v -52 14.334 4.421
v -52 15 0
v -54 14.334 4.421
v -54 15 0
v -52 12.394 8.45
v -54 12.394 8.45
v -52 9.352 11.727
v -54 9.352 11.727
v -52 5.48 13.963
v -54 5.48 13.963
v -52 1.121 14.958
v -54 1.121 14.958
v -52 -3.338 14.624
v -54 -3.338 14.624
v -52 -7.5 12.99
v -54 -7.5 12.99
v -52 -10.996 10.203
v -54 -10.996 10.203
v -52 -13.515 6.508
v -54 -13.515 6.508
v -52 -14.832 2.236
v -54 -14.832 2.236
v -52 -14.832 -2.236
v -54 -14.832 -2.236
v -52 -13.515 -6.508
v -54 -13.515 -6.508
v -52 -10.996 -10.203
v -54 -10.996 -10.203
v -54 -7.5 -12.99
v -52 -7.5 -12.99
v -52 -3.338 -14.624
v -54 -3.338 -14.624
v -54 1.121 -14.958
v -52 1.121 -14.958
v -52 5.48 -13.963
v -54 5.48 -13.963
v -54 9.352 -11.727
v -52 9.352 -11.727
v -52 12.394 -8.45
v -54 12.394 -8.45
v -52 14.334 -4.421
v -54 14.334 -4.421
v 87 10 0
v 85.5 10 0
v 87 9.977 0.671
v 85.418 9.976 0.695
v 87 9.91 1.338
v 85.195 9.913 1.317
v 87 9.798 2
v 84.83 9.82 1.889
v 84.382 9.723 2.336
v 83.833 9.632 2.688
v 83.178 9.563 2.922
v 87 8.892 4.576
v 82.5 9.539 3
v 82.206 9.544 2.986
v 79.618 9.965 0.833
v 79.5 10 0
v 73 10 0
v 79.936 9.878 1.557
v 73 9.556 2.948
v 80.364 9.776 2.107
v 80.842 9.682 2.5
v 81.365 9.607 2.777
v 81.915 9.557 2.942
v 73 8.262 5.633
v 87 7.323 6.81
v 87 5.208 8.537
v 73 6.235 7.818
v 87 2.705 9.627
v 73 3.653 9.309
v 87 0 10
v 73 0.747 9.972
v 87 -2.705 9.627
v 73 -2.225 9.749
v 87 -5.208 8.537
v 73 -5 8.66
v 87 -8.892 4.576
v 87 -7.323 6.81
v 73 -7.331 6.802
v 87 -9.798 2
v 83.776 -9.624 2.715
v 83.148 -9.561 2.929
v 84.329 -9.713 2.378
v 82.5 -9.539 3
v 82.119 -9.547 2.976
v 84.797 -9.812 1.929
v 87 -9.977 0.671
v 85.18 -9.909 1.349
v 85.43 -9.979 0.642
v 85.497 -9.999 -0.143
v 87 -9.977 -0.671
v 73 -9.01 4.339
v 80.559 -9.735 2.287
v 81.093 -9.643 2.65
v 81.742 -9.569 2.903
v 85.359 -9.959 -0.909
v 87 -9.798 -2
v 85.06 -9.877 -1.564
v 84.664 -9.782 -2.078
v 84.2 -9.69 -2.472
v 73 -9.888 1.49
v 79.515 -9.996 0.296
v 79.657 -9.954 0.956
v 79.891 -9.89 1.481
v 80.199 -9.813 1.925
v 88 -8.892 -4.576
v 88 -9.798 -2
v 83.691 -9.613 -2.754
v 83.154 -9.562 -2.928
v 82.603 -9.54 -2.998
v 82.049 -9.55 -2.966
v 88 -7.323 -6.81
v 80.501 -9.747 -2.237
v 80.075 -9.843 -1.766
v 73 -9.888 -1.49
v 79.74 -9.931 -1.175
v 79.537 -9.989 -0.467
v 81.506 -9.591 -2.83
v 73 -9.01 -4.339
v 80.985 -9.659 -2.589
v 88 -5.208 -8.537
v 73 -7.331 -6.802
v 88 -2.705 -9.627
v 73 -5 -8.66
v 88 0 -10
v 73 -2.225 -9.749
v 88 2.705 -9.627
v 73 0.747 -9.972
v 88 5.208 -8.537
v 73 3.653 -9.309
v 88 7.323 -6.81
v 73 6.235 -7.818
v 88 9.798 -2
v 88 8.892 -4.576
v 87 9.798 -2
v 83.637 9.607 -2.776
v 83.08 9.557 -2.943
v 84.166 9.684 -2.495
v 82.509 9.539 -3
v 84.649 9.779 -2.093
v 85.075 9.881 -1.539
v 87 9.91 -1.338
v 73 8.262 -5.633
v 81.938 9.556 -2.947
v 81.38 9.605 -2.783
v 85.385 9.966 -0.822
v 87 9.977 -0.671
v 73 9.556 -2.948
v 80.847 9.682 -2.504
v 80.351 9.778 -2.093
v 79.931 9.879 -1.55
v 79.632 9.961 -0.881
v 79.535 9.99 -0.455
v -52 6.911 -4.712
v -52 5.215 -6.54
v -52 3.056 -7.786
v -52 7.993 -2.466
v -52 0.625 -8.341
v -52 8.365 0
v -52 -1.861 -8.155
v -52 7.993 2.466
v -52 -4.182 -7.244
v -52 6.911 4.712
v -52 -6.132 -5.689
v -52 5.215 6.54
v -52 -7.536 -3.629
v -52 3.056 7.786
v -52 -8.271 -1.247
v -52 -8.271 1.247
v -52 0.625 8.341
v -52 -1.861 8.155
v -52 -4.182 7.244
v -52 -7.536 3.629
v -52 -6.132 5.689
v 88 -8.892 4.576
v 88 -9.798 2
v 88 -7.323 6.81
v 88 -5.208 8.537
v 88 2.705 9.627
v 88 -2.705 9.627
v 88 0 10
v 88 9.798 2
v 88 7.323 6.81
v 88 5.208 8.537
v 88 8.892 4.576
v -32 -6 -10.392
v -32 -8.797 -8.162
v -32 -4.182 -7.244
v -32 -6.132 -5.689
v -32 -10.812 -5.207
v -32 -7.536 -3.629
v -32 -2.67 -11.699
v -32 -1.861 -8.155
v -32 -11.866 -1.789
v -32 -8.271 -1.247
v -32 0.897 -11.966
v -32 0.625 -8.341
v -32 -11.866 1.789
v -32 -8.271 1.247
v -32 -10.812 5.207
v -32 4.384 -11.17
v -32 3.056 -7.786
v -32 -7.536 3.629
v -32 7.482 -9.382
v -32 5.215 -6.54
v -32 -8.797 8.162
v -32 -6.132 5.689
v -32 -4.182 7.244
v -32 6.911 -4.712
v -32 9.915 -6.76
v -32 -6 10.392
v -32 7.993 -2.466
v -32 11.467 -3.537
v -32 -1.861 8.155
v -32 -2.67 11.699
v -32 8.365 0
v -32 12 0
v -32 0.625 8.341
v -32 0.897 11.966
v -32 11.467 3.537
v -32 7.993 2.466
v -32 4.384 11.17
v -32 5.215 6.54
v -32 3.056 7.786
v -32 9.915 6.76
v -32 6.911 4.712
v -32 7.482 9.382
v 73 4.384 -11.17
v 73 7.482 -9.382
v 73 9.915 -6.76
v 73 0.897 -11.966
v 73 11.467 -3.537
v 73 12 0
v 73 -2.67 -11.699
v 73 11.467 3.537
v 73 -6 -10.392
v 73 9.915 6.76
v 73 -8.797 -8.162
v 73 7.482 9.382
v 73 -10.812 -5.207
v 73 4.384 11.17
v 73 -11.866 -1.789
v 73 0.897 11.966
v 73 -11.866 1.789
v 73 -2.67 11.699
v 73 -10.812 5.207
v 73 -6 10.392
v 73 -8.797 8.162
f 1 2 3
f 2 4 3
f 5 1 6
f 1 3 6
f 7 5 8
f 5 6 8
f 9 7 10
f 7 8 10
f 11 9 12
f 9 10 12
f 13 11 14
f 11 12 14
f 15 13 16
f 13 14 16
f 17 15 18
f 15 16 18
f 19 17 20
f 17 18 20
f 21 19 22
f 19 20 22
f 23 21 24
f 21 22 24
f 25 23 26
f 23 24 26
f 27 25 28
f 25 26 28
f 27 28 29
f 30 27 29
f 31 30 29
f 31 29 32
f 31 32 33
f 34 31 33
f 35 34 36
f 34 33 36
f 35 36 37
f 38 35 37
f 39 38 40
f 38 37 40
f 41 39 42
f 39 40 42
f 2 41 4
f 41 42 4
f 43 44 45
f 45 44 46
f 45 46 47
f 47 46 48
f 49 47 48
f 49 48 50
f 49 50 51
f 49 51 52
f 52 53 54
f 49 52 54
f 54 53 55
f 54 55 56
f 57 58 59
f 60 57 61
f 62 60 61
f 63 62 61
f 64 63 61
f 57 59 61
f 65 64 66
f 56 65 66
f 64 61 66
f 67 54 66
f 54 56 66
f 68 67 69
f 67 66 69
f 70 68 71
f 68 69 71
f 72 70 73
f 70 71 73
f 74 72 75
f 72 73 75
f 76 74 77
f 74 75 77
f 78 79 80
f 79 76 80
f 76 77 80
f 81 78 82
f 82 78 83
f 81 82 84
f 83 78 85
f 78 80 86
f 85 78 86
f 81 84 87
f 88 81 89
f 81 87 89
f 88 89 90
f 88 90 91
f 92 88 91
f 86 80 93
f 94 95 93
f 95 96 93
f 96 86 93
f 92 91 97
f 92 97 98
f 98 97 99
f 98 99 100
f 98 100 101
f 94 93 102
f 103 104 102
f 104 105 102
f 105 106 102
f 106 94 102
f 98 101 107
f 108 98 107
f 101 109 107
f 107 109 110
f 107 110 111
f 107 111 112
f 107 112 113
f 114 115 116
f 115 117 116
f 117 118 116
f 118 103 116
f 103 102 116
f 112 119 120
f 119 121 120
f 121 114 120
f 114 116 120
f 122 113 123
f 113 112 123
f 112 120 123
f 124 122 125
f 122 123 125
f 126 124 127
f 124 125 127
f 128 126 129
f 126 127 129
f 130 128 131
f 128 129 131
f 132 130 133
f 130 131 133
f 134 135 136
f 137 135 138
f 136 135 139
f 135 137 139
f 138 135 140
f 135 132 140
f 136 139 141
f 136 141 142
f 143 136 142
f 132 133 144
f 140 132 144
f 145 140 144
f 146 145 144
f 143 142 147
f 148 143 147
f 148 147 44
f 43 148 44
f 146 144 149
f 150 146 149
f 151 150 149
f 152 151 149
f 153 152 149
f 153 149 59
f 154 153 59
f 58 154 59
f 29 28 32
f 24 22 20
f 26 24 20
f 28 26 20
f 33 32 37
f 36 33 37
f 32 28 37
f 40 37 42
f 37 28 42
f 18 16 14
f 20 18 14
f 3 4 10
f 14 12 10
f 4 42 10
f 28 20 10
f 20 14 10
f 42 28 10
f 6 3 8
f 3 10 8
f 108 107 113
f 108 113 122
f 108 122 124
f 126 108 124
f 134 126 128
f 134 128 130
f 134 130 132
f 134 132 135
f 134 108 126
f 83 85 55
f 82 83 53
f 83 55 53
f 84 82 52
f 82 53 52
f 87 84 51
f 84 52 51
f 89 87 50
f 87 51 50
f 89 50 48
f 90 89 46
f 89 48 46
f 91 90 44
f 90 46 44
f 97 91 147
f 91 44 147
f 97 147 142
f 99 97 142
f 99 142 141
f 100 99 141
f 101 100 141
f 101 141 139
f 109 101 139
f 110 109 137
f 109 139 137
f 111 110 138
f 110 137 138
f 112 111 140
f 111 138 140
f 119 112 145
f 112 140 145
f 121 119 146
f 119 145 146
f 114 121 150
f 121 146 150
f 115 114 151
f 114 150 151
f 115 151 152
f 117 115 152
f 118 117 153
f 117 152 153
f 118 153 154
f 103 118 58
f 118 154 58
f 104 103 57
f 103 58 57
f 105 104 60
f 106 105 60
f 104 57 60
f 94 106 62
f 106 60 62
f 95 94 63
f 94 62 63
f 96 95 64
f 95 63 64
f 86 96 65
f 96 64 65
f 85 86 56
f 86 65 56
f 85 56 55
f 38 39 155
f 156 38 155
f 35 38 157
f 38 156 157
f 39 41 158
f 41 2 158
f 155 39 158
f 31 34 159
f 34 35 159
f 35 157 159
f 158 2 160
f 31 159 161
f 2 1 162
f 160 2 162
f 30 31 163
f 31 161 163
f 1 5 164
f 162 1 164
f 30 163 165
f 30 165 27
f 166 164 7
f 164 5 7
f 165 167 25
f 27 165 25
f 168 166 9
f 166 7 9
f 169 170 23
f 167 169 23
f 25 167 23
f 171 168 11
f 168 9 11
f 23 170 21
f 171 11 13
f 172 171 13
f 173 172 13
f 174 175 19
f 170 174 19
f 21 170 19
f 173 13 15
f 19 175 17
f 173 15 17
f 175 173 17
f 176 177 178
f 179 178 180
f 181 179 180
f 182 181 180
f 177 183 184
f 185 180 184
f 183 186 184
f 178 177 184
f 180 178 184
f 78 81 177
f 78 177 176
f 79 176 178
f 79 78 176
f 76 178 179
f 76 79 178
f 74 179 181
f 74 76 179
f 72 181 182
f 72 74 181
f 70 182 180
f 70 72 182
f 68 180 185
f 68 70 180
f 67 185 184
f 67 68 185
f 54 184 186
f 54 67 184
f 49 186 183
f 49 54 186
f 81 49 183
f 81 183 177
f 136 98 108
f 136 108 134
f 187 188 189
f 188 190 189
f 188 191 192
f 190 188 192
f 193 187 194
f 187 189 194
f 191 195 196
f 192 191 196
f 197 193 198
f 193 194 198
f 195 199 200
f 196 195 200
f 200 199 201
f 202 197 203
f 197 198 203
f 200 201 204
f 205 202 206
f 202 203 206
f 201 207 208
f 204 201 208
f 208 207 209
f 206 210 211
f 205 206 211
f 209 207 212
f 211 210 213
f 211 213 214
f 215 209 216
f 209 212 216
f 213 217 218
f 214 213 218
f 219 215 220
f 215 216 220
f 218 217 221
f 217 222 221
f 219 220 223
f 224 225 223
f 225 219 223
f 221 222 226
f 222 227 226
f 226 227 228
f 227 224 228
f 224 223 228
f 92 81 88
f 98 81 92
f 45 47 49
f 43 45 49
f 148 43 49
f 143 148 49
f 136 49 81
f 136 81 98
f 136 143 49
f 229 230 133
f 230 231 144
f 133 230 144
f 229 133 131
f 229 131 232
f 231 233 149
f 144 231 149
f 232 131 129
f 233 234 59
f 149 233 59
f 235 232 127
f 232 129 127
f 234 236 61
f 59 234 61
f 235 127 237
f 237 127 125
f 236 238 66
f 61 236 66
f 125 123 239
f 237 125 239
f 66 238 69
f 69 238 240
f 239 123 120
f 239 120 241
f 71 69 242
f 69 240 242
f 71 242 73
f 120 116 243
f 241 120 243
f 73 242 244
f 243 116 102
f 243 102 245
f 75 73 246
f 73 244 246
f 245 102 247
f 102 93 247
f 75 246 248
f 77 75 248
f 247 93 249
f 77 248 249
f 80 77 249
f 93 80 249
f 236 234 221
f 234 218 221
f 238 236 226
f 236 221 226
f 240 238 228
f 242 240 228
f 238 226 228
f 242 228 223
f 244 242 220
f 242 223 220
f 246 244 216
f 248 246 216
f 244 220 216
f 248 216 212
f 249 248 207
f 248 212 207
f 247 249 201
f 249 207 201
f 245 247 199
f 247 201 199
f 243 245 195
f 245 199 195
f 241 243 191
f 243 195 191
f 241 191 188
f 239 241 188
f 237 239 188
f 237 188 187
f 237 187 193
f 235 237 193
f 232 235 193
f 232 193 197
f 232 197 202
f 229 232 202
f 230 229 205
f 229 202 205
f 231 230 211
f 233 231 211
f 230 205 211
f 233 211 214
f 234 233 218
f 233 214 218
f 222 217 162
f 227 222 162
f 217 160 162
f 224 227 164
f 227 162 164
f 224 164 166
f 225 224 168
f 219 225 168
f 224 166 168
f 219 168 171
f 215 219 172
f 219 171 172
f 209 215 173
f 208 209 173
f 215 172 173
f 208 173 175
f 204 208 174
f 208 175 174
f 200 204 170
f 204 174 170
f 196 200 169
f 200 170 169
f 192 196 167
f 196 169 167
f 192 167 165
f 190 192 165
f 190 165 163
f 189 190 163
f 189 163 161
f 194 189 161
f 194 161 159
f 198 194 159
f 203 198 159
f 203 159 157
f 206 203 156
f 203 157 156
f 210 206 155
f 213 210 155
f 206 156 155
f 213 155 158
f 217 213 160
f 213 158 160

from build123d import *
from build123d.topology import SkipClean

# Parameters (mm, degrees)
ESQUISSE2_R             = 10
EXTRUSION1_DEPTH        = 15
ENL_V_START             = -1
ENL_V_MAT_EXTRU_1_DEPTH = 1
EXTRUSION2_DEPTH        = 1
ESQUISSE5_W             = 3
ESQUISSE5_H             = 20


with BuildPart() as part:
    # Esquisse1 → Révolution1 (revolve)
    with BuildSketch(Plane.XY):
        Polygon((-54, 15), (-54, 0), (73, 0), (73, 12), (-32, 12), (-32, 8.364637375), (-52, 8.364637375), (-52, 15), align=None)
    revolve(axis=Axis((-54, 0, 0), (1, 0, 0)))

    # Esquisse2 → Extrusion1 (add)
    with BuildSketch(Plane(origin=(73, 0, 0), x_dir=(0, 0, -1), z_dir=(1, 0, 0))):
        with Locations(Location((0, 0, 0), (0, 0, 90))):
            Circle(ESQUISSE2_R)
    extrude(amount=EXTRUSION1_DEPTH)

    # Esquisse3 → Enlèv. mat.-Extru.1 (cut)
    with BuildSketch(Plane(origin=(88, 0, 0), x_dir=(0, 0, -1), z_dir=(1, 0, 0)).offset(ENL_V_START)):
        with BuildLine():
            Line((2, -9.797958971), (2, 9.797958971))
            ThreePointArc((2, 9.797958971), (-10, 0), (2, -9.797958971))
        make_face()
    extrude(amount=ENL_V_MAT_EXTRU_1_DEPTH, mode=Mode.SUBTRACT)

    # Esquisse4 → Extrusion2 (add)
    with SkipClean():  # the faces are left unmerged after this step: merging them gives an invalid solid
        with BuildSketch(Plane(origin=(87, 0, 0), x_dir=(0, 0, -1), z_dir=(1, 0, 0))):
            with BuildLine():
                Line((-2, 9.797958971), (-2, -9.797958971))
                ThreePointArc((-2, -9.797958971), (-10, 0), (-2, 9.797958971))
            make_face()
        extrude(amount=EXTRUSION2_DEPTH)

    # Esquisse5 → Enlèvement de matière-Révolution1 (revolve, cut)
    with BuildSketch(Plane.XY, mode=Mode.PRIVATE) as enl_vement_de_mati_re_r_volution1_sk:
        with Locations((81, 0)):
            Rectangle(ESQUISSE5_W, ESQUISSE5_H)
    revolve(enl_vement_de_mati_re_r_volution1_sk.sketch.rotate(Axis((82.5, -10, 0), (0, 1, 0)), 90), axis=Axis((82.5, -10, 0), (0, 1, 0)), mode=Mode.SUBTRACT)


solid = part.part
